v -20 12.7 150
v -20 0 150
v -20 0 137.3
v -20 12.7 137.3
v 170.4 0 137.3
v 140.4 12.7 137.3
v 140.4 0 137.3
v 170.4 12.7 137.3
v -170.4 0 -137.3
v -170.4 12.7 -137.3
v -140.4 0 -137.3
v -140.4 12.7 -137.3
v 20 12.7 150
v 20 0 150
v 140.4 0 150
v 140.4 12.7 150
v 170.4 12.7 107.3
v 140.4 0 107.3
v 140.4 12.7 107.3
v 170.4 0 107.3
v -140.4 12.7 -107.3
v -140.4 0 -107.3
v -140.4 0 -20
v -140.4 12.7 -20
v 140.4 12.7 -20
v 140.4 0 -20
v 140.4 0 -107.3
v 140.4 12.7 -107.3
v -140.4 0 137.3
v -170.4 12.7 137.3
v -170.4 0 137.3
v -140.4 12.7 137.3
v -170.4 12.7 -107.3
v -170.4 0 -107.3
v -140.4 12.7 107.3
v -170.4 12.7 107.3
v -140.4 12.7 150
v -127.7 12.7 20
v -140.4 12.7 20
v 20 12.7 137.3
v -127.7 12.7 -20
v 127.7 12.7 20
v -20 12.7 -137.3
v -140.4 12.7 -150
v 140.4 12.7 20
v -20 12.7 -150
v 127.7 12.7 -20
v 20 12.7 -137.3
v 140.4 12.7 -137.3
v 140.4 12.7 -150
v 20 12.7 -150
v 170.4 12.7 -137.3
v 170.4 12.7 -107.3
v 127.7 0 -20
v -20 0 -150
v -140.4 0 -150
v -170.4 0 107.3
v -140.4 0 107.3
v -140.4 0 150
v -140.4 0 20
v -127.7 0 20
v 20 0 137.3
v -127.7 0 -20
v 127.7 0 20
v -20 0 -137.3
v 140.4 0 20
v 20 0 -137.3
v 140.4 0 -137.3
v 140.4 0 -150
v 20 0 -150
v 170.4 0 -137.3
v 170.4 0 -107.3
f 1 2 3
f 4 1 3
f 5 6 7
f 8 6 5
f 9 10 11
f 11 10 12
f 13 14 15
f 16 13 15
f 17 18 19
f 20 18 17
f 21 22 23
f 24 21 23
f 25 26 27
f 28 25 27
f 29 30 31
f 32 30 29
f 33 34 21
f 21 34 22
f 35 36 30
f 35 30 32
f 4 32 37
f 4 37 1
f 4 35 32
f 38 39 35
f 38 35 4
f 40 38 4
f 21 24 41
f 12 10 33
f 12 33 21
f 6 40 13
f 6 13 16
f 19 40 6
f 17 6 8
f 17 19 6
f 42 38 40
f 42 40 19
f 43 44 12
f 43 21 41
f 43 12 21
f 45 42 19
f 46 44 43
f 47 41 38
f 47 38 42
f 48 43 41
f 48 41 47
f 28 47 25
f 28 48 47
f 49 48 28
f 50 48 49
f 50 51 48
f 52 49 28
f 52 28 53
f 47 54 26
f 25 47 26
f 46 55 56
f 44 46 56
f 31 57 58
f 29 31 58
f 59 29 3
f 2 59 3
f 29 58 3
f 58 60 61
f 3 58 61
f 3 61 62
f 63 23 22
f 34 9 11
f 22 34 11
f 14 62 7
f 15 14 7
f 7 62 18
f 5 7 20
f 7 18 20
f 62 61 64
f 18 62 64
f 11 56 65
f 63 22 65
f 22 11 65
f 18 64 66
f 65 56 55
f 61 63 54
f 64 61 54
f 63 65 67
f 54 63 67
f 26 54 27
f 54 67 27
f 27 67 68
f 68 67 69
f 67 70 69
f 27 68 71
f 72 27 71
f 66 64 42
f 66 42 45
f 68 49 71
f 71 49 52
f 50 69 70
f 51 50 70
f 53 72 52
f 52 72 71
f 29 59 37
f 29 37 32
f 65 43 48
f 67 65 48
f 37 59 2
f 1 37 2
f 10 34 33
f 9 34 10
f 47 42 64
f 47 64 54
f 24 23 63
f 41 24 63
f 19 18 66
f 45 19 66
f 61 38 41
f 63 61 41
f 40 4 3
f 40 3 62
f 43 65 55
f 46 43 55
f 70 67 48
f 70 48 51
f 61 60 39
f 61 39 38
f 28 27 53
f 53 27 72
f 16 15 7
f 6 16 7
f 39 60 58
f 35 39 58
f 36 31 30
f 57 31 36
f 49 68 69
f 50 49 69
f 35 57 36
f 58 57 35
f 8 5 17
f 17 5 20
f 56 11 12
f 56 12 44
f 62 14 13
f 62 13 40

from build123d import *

# Parameters (mm, degrees)
SKETCH1_W           = 30
SKETCH1_H           = 42.7
BOSS_EXTRUDE1_DEPTH = 12.7
SKETCH2_W           = 40
SKETCH2_H           = 12.7
SKETCH2_W_2         = 12.7
SKETCH2_H_2         = 40
SKETCH2_W_3         = 30
CUT_EXTRUDE2_DEPTH  = 12.7


with BuildPart() as part:
    # Sketch1 → Boss-Extrude1 (new body)
    with BuildSketch(Plane(origin=(0, 0, 0), x_dir=(1, 0, 0), z_dir=(0, 1, 0))):
        Polygon((140.4, 150), (-140.4, 150), (-140.4, 107.3), (-140.4, -107.3), (-140.4, -150), (140.4, -150), (140.4, -107.3), (140.4, 107.3), align=None)
        with Locations((-155.4, 128.65)):
            Rectangle(SKETCH1_W, SKETCH1_H)
        with Locations((155.4, 128.65)):
            Rectangle(SKETCH1_W, SKETCH1_H)
        with Locations((-155.4, -128.65)):
            Rectangle(SKETCH1_W, SKETCH1_H)
        with Locations((155.4, -128.65)):
            Rectangle(SKETCH1_W, SKETCH1_H)
    extrude(amount=BOSS_EXTRUDE1_DEPTH)

    # Sketch2 → Cut-Extrude2 (cut)
    with BuildSketch(Plane(origin=(0, 12.7, 0), x_dir=(1, 0, 0), z_dir=(0, 1, 0))):
        with Locations((0, -143.65)):
            Rectangle(SKETCH2_W, SKETCH2_H)
        with Locations((-134.05, 0)):
            Rectangle(SKETCH2_W_2, SKETCH2_H_2)
        with Locations((134.05, 0)):
            Rectangle(SKETCH2_W_2, SKETCH2_H_2)
        with Locations((0, 143.65)):
            Rectangle(SKETCH2_W, SKETCH2_H)
        with Locations((-155.4, 143.65)):
            Rectangle(SKETCH2_W_3, SKETCH2_H)
        with Locations((155.4, 143.65)):
            Rectangle(SKETCH2_W_3, SKETCH2_H)
        with Locations((-155.4, -143.65)):
            Rectangle(SKETCH2_W_3, SKETCH2_H)
        with Locations((155.4, -143.65)):
            Rectangle(SKETCH2_W_3, SKETCH2_H)
    extrude(amount=-CUT_EXTRUDE2_DEPTH, mode=Mode.SUBTRACT)


solid = part.part
